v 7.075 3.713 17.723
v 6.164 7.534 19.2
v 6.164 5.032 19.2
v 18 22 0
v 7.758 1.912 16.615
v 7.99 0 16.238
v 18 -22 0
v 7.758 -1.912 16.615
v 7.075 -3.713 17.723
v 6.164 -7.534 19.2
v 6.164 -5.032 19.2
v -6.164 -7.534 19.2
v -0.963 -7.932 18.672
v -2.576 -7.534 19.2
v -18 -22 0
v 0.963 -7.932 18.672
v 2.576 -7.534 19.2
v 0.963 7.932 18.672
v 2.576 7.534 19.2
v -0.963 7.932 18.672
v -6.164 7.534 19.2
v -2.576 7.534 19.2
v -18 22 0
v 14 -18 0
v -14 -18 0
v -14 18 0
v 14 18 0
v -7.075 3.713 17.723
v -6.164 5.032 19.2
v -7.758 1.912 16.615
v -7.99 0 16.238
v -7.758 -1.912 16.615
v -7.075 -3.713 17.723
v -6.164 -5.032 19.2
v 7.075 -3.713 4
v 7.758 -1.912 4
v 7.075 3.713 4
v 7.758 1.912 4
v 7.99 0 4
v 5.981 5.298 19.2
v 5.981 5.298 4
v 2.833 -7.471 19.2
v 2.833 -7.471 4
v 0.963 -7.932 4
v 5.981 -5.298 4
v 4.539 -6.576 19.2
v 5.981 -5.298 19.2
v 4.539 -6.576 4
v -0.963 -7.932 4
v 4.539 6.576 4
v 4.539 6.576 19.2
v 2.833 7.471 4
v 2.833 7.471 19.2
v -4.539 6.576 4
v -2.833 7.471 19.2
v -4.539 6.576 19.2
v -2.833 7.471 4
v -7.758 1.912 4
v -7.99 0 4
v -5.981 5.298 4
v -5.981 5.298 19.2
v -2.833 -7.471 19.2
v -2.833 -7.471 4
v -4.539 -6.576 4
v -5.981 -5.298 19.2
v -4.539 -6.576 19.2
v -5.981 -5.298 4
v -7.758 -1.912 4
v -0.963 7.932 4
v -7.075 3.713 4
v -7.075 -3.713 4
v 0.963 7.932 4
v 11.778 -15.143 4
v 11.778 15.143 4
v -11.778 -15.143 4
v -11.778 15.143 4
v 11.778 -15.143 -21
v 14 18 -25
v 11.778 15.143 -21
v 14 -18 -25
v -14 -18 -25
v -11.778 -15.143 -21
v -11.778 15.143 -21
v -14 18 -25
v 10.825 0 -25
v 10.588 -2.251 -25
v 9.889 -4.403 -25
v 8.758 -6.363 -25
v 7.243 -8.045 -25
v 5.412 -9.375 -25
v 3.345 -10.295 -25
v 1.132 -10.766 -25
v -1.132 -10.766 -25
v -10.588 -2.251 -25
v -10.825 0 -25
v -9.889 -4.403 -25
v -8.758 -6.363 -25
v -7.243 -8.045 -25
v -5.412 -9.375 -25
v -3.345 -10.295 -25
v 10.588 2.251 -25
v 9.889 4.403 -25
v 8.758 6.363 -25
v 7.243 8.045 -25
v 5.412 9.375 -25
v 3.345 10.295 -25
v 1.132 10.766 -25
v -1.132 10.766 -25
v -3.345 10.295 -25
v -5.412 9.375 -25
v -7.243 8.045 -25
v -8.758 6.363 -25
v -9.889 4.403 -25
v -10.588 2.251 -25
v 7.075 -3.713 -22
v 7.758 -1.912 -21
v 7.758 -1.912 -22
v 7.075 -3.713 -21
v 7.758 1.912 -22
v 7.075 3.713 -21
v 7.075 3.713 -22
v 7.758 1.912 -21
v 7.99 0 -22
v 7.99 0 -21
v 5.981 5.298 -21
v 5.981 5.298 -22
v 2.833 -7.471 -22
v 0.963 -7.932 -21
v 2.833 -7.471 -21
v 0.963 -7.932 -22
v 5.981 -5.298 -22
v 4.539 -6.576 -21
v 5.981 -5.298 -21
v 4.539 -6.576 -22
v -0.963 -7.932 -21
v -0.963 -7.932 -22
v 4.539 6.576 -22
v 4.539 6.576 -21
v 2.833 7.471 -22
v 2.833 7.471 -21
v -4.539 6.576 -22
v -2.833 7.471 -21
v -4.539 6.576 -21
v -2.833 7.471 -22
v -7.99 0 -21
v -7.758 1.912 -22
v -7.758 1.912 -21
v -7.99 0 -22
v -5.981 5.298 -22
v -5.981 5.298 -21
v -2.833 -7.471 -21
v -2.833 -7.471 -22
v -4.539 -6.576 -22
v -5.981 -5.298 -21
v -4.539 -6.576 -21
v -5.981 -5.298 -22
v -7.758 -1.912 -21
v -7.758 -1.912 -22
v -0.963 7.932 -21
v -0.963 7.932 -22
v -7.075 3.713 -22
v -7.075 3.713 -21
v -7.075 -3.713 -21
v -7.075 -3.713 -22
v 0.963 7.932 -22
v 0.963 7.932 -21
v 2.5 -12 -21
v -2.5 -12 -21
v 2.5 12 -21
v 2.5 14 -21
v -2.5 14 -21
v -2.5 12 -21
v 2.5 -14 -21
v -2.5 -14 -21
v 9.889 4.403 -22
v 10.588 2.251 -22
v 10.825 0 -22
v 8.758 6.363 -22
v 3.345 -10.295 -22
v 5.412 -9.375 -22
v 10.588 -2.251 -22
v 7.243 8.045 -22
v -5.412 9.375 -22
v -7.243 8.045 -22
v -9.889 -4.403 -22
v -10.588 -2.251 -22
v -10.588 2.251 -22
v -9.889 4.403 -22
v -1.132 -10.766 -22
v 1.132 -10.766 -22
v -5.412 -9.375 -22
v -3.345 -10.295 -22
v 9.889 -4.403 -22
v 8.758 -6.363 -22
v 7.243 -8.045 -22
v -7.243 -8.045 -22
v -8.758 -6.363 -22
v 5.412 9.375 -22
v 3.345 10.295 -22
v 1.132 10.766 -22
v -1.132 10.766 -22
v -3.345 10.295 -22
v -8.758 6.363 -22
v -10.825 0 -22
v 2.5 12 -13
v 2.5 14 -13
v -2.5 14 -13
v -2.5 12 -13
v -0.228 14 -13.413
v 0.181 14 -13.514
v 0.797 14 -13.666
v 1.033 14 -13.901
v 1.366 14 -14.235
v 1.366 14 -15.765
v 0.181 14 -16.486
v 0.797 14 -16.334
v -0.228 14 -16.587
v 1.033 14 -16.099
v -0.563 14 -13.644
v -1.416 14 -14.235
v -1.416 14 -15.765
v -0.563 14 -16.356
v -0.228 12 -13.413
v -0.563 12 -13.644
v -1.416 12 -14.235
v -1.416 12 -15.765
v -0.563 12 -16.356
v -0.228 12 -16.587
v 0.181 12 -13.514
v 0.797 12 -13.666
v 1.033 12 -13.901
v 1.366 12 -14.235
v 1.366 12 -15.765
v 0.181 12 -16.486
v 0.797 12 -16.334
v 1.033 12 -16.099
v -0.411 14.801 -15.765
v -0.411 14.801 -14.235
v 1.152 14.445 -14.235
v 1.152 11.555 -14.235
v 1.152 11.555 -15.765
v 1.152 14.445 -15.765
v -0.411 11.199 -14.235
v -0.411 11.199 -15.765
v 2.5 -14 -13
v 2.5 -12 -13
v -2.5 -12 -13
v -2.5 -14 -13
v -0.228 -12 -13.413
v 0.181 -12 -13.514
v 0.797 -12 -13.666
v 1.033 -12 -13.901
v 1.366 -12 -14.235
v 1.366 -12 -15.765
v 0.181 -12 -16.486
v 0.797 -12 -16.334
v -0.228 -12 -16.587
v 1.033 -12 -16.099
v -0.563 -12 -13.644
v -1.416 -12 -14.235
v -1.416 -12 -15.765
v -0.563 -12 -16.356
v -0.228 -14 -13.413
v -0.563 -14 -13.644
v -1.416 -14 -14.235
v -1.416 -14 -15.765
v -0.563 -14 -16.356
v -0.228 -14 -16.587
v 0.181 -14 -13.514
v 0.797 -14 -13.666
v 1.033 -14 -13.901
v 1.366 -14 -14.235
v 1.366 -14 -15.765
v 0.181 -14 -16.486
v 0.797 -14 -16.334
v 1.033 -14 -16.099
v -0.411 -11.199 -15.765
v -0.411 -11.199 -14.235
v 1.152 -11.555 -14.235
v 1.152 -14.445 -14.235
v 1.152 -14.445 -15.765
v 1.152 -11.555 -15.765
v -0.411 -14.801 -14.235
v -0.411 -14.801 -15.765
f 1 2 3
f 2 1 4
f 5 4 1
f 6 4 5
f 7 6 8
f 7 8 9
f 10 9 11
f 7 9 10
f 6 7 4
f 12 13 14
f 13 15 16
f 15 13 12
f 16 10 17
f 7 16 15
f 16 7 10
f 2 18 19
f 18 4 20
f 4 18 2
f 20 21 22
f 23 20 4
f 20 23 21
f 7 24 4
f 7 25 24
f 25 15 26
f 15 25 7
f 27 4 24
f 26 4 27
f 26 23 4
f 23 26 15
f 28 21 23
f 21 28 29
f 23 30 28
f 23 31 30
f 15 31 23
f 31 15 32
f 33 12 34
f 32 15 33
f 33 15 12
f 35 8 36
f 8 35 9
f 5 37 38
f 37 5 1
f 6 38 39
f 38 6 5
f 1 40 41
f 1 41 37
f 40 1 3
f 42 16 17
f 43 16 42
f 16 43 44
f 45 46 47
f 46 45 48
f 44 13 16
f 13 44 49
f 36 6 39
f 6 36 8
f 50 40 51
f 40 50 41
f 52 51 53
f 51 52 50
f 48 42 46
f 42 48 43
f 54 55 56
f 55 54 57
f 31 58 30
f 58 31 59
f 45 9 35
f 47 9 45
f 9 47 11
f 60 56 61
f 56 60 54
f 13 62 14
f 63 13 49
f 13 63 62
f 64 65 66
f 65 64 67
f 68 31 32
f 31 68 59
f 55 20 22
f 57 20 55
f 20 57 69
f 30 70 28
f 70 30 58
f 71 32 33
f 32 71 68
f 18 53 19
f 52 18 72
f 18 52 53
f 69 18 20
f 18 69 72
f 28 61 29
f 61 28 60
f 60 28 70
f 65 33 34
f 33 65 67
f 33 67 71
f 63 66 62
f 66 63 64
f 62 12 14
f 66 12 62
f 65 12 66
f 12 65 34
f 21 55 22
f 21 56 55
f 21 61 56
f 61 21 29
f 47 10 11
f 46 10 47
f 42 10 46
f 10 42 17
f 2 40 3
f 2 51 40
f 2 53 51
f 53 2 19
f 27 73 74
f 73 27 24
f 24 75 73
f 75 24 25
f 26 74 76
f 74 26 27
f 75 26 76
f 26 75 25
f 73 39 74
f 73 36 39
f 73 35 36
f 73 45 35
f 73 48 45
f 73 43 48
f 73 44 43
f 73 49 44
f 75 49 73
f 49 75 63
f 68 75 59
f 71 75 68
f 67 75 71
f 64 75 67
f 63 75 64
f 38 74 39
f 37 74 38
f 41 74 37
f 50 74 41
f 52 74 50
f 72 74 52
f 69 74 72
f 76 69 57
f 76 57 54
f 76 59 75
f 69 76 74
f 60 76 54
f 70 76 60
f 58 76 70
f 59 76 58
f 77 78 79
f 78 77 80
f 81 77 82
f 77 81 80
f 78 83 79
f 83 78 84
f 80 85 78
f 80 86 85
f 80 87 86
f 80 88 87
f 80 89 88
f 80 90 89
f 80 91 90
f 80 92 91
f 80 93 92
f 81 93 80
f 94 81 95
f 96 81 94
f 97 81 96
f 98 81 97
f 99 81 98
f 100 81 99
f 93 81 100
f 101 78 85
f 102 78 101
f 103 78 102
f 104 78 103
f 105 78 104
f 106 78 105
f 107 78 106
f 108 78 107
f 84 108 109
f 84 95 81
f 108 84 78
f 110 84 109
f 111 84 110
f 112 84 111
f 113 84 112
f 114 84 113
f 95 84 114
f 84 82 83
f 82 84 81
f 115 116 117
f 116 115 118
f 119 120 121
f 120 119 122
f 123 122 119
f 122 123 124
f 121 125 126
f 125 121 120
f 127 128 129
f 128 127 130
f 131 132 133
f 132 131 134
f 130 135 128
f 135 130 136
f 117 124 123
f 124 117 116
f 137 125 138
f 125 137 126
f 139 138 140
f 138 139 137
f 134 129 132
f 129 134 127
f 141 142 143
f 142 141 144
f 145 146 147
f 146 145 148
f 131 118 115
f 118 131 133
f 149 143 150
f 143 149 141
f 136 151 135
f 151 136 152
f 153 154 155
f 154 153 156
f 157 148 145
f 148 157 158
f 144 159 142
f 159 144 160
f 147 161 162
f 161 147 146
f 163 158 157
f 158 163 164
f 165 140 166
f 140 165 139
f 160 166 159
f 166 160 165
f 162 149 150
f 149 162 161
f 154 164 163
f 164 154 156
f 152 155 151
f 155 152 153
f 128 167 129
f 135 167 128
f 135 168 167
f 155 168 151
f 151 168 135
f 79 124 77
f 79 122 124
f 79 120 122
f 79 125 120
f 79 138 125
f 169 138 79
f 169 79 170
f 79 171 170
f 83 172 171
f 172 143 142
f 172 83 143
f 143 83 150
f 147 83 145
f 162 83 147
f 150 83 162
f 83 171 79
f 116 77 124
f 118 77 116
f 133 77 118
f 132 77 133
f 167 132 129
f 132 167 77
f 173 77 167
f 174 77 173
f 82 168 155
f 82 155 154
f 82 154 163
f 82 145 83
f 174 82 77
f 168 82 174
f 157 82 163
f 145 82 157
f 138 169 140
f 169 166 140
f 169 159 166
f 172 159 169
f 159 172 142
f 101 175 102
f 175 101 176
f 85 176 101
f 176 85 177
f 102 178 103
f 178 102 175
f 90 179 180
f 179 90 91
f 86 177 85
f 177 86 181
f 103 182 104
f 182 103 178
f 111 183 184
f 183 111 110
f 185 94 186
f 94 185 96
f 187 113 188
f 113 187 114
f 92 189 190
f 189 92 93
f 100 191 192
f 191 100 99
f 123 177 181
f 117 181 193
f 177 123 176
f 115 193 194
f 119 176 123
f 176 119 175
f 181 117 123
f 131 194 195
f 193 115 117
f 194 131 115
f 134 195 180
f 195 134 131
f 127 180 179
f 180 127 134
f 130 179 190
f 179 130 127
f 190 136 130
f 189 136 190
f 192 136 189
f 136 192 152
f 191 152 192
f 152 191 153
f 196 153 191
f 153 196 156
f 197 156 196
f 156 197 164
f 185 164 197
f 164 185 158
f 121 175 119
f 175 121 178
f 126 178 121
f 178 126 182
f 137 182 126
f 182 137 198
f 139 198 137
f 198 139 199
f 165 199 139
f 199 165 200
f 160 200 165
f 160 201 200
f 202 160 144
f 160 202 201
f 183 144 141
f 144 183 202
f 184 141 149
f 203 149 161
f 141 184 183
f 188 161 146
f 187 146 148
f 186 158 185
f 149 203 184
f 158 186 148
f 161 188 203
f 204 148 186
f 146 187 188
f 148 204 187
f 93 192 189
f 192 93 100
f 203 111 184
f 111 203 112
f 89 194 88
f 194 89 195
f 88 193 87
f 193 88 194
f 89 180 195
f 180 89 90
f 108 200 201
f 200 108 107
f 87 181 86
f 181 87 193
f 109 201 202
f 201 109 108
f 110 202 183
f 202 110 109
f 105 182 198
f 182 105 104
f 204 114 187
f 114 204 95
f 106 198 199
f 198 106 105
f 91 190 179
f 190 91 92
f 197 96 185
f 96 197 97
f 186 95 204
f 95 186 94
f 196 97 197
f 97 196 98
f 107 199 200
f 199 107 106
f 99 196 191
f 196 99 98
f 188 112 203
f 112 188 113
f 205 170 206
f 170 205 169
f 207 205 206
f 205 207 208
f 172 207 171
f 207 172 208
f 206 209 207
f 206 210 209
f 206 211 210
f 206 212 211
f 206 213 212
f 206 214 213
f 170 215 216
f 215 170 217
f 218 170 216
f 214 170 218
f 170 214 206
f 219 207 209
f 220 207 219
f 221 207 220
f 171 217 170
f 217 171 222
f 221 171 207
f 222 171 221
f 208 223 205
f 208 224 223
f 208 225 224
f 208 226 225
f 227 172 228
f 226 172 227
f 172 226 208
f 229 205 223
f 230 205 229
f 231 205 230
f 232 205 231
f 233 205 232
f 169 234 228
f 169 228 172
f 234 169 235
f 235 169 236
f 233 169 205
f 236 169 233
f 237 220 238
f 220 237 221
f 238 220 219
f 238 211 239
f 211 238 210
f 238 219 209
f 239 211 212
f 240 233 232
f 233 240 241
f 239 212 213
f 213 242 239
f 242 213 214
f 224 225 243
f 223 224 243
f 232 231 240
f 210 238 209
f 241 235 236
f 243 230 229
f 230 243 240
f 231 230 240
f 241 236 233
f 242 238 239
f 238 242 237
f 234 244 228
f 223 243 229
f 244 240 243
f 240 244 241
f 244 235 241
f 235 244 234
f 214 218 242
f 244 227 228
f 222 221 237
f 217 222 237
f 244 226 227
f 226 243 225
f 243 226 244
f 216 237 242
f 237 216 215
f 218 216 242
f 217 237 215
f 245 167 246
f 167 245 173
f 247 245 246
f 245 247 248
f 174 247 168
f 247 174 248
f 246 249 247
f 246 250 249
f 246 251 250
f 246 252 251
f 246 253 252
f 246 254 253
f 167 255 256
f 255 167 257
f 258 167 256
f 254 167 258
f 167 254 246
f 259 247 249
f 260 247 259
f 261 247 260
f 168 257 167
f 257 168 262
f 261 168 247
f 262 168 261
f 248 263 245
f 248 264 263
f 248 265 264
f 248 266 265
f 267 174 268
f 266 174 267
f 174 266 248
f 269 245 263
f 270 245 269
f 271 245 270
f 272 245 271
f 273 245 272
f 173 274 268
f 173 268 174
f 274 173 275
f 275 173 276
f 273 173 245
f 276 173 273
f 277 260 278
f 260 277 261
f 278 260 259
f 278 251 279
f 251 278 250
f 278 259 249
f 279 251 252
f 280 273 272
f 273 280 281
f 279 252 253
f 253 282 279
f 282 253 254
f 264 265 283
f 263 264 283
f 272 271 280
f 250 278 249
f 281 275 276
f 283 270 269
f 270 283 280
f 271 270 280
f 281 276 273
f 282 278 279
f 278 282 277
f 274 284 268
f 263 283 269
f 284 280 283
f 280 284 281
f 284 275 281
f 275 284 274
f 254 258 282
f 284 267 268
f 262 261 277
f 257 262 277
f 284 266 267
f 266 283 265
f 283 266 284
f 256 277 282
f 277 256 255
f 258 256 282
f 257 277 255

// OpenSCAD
sideLength=36;
frontLength=44;

sideHalf=sideLength / 2;
frontHalf=frontLength / 2;

//There is a raised ring at the base of the existing TS2 neck.  We will call this the "neck base".
neckBaseDiameter=21.65;
neckBaseRadius=neckBaseDiameter / 2;
neckBaseHeight=3;

// TODO: Increase the height for the extension accessory?
neckHeight=21.2;
// TODO: Change to diameter of extension accessory. Consider raised insignia.
neckDiameter=15.98;
// TODO: Implement the base diameter and height.

neckRadius=neckDiameter / 2;
height=neckHeight+8;

baseOffset=4;

clipX = 5;
clipY = 2; //TODO: Flex?
clipZ = 8;
clipR = clipX;


// Remove space for existing neck.
module pyramid (
    sideHalf,
    frontHalf,
    height,
    neckRadius
) {
    difference() {
        polyhedron(
          points=[ [sideHalf,frontHalf,0],[sideHalf,-frontHalf,0],[-sideHalf,-frontHalf,0],[-sideHalf,frontHalf,0], // the four points at base
                   [0,0,height]  ],                                 // the apex point 
          faces=[ [0,1,4],[1,2,4],[2,3,4],[3,0,4],              // each triangle side
                      [1,0,3],[2,1,3] ]                         // two triangles for square base
         );
        
        //Uncomment color and remove difference to reveal neck cylinder. 
        //color("Lime") {
        cylinder(h=height, r1=neckRadius, r2=neckRadius);
    }
}

// Remove points from pyramid support.
module pyramid01(
    sideHalf,
    frontHalf,
    height,
    neckRadius
) {
    difference() {
        pyramid(sideHalf,frontHalf,height,neckRadius);
        translate([0, 0, neckHeight - 2]) cylinder(h=6, r1=neckRadius + 6, r2=neckRadius + 6);
    }
}

// Create the base plate
module base (
    sideHalf,
    frontHalf,
    height,
    neckRadius,
    baseOffset
) {

    x = sideHalf - baseOffset;
    y = frontHalf - baseOffset;
    z = height - baseOffset;

    difference() {
        pyramid(x,y,z,neckRadius);
        translate([0,0, (z / 2) + baseOffset]) cube([y * 2, y * 2, z], center = true);
    }        
}

// The base with the neck base removed.
module baseNeckBase(
    sideHalf,
    frontHalf,
    height,
    neckRadius,
    neckBaseHeight,
    neckBaseRadius,
    baseOffset
) {
    // remove short cylinder for neck base
    difference() {
        base(sideHalf,frontHalf,height,neckRadius,baseOffset);
        cylinder(h=neckBaseHeight, r1=neckBaseRadius, r2=neckBaseRadius);
    }
}

//TODO: Reinforce clip base connection.
module clip(x, y, z) {
    color("Lime") {
        cube([x, y, z], center = true);
        translate([0, 0, (z / 2) - y]) sphere(r = y); 
    }
}

// Base with clips.
module baseClips (
    sideHalf,
    frontHalf,
    height,
    neckRadius,
    neckBaseHeight,
    neckBaseRadius,
    baseOffset,
    clipX,
    clipY,
    clipZ
) {
    baseNeckBase(sideHalf,frontHalf,height,neckRadius,neckBaseHeight,neckBaseRadius,baseOffset);
    
    translate([0, 13, (clipZ / 2) + baseOffset]) 
        clip(clipX, clipY, clipZ);
    translate([0, -13, (clipZ / 2) + baseOffset]) 
        clip(clipX, clipY, clipZ);

// For simplicty and ease of removal, try just 2 clips first. 
//    rotate([0, 0, 90]) 
//        translate([0, 10.5, (clipZ / 2) + baseOffset]) 
//            clip(clipX, clipY, clipZ);
//    rotate([0, 0, 90]) 
//        translate([0, -10.5,(clipZ / 2) + baseOffset]) 
//            clip(clipX, clipY, clipZ);    
}

// Remove the base plate from the pyramid.
module pyramid02 (
    sideHalf,
    frontHalf,
    height,
    neckRadius
) {
     difference() {
        pyramid01(sideHalf,frontHalf,height,neckRadius);
        
        //TODO: BaseClipsNeg: internal ridge for bump. Extra space behind the clip to allow for flex
        // Remove base, not baseNeckBase. The latter would leave material where the neck base ring was removed.
        base(sideHalf,frontHalf,height,neckRadius,baseOffset);
    }   
}



pyramid02(sideHalf,frontHalf,height,neckRadius);

bZ = -25;

translate([0, 0, bZ]) 
    baseClips(
        sideHalf,
        frontHalf,
        height,
        neckRadius,
        neckBaseHeight,
        neckBaseRadius,
        baseOffset,
        clipX,
        clipY,
        clipZ
        );
